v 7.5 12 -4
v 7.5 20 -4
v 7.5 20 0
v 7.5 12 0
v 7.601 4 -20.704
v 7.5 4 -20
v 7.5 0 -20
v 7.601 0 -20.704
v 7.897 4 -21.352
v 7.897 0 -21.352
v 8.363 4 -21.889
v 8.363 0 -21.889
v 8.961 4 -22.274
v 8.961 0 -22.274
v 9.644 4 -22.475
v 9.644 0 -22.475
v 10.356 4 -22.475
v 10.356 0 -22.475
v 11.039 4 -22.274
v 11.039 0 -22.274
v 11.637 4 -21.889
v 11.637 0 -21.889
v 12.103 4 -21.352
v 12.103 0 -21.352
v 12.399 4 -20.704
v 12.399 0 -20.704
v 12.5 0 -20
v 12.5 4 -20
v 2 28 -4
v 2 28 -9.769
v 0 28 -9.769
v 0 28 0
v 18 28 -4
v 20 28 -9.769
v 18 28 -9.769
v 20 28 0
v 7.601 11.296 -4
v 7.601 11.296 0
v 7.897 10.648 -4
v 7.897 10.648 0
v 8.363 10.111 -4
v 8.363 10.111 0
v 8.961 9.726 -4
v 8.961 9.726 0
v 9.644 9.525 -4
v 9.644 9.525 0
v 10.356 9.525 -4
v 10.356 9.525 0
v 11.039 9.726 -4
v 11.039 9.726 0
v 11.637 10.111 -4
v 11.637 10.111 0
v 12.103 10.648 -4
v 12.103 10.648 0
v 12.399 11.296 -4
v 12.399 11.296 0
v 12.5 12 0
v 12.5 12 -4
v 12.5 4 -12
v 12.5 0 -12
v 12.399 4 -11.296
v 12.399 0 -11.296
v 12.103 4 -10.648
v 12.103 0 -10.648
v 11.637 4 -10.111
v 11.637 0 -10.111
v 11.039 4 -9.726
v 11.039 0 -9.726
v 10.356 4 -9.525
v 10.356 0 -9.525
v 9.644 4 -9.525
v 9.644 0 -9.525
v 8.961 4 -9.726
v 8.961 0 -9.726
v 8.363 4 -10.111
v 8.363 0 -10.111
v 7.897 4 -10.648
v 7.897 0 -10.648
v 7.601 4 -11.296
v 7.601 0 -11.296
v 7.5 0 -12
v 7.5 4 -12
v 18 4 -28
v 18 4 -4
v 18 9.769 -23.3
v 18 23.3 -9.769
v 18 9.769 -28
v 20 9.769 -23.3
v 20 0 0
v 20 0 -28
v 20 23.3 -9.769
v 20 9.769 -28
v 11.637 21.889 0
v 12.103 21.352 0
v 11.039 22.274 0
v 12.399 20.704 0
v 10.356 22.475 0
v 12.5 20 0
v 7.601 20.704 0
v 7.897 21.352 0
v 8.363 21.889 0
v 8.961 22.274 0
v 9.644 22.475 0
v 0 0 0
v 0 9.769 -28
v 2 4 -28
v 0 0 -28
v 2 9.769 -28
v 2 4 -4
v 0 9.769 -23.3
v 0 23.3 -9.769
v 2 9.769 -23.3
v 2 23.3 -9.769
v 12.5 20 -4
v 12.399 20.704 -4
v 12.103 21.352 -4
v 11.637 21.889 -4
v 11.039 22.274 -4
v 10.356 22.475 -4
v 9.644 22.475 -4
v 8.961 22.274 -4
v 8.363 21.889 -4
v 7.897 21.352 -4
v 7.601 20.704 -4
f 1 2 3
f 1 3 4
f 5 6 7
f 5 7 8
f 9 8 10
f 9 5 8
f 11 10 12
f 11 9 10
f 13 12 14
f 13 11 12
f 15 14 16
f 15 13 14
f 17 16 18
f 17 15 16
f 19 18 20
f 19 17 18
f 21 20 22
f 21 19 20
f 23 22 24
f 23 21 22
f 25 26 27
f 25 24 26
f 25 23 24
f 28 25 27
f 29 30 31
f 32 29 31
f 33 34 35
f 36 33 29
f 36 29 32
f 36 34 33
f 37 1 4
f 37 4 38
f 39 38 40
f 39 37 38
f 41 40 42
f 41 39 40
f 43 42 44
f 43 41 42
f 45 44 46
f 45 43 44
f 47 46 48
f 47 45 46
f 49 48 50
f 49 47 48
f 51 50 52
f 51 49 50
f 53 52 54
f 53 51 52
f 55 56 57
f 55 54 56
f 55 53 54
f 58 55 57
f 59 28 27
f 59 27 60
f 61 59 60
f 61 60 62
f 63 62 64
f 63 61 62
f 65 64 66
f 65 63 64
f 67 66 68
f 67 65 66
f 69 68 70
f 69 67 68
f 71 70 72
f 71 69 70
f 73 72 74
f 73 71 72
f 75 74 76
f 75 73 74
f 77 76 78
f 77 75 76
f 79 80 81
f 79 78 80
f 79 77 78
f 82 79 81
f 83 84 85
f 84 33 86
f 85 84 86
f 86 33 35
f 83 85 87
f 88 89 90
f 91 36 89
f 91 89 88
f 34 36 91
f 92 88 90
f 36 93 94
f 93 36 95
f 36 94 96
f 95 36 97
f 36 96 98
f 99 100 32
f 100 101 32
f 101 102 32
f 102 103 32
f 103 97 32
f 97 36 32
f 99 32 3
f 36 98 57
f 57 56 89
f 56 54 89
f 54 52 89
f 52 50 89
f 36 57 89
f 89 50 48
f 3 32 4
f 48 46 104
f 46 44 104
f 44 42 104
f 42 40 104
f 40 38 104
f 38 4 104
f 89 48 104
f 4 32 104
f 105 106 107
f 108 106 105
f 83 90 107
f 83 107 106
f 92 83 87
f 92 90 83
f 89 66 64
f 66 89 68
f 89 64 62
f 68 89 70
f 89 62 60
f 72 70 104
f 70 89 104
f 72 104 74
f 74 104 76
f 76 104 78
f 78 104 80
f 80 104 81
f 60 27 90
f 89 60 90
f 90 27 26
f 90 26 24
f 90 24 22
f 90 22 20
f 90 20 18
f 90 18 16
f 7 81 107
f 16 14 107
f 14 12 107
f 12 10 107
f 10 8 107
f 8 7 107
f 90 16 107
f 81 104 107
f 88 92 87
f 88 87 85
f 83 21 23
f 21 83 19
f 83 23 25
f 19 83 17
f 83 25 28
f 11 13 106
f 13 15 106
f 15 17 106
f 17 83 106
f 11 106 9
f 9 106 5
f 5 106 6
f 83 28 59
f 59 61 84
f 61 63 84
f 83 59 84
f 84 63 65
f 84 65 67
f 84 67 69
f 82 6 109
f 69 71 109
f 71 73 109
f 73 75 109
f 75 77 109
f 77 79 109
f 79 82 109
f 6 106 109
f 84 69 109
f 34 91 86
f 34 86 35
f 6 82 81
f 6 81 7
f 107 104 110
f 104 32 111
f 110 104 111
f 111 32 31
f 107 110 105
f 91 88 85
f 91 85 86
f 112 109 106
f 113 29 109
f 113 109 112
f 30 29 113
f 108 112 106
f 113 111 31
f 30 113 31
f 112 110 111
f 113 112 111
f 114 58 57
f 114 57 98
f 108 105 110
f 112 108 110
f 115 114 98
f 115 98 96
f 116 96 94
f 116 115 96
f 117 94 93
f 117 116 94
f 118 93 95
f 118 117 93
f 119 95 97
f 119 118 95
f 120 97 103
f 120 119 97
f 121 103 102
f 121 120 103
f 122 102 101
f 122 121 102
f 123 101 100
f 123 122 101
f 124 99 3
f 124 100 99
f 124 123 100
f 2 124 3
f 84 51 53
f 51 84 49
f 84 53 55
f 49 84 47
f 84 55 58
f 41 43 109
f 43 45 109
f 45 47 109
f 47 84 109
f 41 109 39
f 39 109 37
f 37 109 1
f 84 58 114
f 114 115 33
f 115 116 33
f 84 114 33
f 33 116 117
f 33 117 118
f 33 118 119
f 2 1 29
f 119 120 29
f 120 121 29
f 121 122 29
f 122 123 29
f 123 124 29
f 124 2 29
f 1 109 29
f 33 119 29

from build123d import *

# Parameters (mm, degrees)
BOSS_EXTRUDE2_DEPTH = 20
BOSS_EXTRUDE3_DEPTH = 2
BOSS_EXTRUDE4_START = 20
BOSS_EXTRUDE4_DEPTH = 2
CUT_EXTRUDE1_DEPTH  = 5
CUT_EXTRUDE2_DEPTH  = 5


with BuildPart() as part:
    # Sketch1 → Boss-Extrude2 (new body)
    with BuildSketch(Plane(origin=(0, 0, 0), x_dir=(0, 0, -1), z_dir=(1, 0, 0))):
        Polygon((0, 28), (0, 0), (28, 0), (28, 4), (4, 4), (4, 28), align=None)
    extrude(amount=BOSS_EXTRUDE2_DEPTH)

    # Sketch1_4 → Boss-Extrude3 (add)
    with BuildSketch(Plane(origin=(0, 0, 0), x_dir=(0, 0, -1), z_dir=(1, 0, 0))):
        Polygon((9.768810499, 28), (4, 28), (4, 4), (28, 4), (28, 9.768810499), (23.299944734, 9.768810499), (9.768810499, 23.299944734), align=None)
    extrude(amount=BOSS_EXTRUDE3_DEPTH)

    # Sketch1_5 → Boss-Extrude4 (add)
    with BuildSketch(Plane(origin=(0, 0, 0), x_dir=(0, 0, -1), z_dir=(1, 0, 0)).offset(BOSS_EXTRUDE4_START)):
        Polygon((9.768810499, 28), (4, 28), (4, 4), (28, 4), (28, 9.768810499), (23.299944734, 9.768810499), (9.768810499, 23.299944734), align=None)
    extrude(amount=-BOSS_EXTRUDE4_DEPTH)

    # Sketch2 → Cut-Extrude1 (cut, through all)
    with BuildSketch(Plane(origin=(0, 4, 0), x_dir=(1, 0, 0), z_dir=(0, 1, 0))):
        with BuildLine():
            Line((7.5, 12), (7.5, 20))
            ThreePointArc((7.5, 20), (10, 22.5), (12.5, 20))
            Line((12.5, 20), (12.5, 12))
            ThreePointArc((12.5, 12), (10, 9.5), (7.5, 12))
        make_face()
    extrude(amount=-CUT_EXTRUDE1_DEPTH, mode=Mode.SUBTRACT)

    # Sketch4 → Cut-Extrude2 (cut, through all)
    with BuildSketch(Plane(origin=(0, 0, -4), x_dir=(-1, 0, 0), z_dir=(0, 0, -1))):
        with BuildLine():
            Line((-12.5, 12), (-12.5, 20))
            ThreePointArc((-12.5, 20), (-10, 22.5), (-7.5, 20))
            Line((-7.5, 20), (-7.5, 12))
            ThreePointArc((-7.5, 12), (-10, 9.5), (-12.5, 12))
        make_face()
    extrude(amount=-CUT_EXTRUDE2_DEPTH, mode=Mode.SUBTRACT)


solid = part.part
